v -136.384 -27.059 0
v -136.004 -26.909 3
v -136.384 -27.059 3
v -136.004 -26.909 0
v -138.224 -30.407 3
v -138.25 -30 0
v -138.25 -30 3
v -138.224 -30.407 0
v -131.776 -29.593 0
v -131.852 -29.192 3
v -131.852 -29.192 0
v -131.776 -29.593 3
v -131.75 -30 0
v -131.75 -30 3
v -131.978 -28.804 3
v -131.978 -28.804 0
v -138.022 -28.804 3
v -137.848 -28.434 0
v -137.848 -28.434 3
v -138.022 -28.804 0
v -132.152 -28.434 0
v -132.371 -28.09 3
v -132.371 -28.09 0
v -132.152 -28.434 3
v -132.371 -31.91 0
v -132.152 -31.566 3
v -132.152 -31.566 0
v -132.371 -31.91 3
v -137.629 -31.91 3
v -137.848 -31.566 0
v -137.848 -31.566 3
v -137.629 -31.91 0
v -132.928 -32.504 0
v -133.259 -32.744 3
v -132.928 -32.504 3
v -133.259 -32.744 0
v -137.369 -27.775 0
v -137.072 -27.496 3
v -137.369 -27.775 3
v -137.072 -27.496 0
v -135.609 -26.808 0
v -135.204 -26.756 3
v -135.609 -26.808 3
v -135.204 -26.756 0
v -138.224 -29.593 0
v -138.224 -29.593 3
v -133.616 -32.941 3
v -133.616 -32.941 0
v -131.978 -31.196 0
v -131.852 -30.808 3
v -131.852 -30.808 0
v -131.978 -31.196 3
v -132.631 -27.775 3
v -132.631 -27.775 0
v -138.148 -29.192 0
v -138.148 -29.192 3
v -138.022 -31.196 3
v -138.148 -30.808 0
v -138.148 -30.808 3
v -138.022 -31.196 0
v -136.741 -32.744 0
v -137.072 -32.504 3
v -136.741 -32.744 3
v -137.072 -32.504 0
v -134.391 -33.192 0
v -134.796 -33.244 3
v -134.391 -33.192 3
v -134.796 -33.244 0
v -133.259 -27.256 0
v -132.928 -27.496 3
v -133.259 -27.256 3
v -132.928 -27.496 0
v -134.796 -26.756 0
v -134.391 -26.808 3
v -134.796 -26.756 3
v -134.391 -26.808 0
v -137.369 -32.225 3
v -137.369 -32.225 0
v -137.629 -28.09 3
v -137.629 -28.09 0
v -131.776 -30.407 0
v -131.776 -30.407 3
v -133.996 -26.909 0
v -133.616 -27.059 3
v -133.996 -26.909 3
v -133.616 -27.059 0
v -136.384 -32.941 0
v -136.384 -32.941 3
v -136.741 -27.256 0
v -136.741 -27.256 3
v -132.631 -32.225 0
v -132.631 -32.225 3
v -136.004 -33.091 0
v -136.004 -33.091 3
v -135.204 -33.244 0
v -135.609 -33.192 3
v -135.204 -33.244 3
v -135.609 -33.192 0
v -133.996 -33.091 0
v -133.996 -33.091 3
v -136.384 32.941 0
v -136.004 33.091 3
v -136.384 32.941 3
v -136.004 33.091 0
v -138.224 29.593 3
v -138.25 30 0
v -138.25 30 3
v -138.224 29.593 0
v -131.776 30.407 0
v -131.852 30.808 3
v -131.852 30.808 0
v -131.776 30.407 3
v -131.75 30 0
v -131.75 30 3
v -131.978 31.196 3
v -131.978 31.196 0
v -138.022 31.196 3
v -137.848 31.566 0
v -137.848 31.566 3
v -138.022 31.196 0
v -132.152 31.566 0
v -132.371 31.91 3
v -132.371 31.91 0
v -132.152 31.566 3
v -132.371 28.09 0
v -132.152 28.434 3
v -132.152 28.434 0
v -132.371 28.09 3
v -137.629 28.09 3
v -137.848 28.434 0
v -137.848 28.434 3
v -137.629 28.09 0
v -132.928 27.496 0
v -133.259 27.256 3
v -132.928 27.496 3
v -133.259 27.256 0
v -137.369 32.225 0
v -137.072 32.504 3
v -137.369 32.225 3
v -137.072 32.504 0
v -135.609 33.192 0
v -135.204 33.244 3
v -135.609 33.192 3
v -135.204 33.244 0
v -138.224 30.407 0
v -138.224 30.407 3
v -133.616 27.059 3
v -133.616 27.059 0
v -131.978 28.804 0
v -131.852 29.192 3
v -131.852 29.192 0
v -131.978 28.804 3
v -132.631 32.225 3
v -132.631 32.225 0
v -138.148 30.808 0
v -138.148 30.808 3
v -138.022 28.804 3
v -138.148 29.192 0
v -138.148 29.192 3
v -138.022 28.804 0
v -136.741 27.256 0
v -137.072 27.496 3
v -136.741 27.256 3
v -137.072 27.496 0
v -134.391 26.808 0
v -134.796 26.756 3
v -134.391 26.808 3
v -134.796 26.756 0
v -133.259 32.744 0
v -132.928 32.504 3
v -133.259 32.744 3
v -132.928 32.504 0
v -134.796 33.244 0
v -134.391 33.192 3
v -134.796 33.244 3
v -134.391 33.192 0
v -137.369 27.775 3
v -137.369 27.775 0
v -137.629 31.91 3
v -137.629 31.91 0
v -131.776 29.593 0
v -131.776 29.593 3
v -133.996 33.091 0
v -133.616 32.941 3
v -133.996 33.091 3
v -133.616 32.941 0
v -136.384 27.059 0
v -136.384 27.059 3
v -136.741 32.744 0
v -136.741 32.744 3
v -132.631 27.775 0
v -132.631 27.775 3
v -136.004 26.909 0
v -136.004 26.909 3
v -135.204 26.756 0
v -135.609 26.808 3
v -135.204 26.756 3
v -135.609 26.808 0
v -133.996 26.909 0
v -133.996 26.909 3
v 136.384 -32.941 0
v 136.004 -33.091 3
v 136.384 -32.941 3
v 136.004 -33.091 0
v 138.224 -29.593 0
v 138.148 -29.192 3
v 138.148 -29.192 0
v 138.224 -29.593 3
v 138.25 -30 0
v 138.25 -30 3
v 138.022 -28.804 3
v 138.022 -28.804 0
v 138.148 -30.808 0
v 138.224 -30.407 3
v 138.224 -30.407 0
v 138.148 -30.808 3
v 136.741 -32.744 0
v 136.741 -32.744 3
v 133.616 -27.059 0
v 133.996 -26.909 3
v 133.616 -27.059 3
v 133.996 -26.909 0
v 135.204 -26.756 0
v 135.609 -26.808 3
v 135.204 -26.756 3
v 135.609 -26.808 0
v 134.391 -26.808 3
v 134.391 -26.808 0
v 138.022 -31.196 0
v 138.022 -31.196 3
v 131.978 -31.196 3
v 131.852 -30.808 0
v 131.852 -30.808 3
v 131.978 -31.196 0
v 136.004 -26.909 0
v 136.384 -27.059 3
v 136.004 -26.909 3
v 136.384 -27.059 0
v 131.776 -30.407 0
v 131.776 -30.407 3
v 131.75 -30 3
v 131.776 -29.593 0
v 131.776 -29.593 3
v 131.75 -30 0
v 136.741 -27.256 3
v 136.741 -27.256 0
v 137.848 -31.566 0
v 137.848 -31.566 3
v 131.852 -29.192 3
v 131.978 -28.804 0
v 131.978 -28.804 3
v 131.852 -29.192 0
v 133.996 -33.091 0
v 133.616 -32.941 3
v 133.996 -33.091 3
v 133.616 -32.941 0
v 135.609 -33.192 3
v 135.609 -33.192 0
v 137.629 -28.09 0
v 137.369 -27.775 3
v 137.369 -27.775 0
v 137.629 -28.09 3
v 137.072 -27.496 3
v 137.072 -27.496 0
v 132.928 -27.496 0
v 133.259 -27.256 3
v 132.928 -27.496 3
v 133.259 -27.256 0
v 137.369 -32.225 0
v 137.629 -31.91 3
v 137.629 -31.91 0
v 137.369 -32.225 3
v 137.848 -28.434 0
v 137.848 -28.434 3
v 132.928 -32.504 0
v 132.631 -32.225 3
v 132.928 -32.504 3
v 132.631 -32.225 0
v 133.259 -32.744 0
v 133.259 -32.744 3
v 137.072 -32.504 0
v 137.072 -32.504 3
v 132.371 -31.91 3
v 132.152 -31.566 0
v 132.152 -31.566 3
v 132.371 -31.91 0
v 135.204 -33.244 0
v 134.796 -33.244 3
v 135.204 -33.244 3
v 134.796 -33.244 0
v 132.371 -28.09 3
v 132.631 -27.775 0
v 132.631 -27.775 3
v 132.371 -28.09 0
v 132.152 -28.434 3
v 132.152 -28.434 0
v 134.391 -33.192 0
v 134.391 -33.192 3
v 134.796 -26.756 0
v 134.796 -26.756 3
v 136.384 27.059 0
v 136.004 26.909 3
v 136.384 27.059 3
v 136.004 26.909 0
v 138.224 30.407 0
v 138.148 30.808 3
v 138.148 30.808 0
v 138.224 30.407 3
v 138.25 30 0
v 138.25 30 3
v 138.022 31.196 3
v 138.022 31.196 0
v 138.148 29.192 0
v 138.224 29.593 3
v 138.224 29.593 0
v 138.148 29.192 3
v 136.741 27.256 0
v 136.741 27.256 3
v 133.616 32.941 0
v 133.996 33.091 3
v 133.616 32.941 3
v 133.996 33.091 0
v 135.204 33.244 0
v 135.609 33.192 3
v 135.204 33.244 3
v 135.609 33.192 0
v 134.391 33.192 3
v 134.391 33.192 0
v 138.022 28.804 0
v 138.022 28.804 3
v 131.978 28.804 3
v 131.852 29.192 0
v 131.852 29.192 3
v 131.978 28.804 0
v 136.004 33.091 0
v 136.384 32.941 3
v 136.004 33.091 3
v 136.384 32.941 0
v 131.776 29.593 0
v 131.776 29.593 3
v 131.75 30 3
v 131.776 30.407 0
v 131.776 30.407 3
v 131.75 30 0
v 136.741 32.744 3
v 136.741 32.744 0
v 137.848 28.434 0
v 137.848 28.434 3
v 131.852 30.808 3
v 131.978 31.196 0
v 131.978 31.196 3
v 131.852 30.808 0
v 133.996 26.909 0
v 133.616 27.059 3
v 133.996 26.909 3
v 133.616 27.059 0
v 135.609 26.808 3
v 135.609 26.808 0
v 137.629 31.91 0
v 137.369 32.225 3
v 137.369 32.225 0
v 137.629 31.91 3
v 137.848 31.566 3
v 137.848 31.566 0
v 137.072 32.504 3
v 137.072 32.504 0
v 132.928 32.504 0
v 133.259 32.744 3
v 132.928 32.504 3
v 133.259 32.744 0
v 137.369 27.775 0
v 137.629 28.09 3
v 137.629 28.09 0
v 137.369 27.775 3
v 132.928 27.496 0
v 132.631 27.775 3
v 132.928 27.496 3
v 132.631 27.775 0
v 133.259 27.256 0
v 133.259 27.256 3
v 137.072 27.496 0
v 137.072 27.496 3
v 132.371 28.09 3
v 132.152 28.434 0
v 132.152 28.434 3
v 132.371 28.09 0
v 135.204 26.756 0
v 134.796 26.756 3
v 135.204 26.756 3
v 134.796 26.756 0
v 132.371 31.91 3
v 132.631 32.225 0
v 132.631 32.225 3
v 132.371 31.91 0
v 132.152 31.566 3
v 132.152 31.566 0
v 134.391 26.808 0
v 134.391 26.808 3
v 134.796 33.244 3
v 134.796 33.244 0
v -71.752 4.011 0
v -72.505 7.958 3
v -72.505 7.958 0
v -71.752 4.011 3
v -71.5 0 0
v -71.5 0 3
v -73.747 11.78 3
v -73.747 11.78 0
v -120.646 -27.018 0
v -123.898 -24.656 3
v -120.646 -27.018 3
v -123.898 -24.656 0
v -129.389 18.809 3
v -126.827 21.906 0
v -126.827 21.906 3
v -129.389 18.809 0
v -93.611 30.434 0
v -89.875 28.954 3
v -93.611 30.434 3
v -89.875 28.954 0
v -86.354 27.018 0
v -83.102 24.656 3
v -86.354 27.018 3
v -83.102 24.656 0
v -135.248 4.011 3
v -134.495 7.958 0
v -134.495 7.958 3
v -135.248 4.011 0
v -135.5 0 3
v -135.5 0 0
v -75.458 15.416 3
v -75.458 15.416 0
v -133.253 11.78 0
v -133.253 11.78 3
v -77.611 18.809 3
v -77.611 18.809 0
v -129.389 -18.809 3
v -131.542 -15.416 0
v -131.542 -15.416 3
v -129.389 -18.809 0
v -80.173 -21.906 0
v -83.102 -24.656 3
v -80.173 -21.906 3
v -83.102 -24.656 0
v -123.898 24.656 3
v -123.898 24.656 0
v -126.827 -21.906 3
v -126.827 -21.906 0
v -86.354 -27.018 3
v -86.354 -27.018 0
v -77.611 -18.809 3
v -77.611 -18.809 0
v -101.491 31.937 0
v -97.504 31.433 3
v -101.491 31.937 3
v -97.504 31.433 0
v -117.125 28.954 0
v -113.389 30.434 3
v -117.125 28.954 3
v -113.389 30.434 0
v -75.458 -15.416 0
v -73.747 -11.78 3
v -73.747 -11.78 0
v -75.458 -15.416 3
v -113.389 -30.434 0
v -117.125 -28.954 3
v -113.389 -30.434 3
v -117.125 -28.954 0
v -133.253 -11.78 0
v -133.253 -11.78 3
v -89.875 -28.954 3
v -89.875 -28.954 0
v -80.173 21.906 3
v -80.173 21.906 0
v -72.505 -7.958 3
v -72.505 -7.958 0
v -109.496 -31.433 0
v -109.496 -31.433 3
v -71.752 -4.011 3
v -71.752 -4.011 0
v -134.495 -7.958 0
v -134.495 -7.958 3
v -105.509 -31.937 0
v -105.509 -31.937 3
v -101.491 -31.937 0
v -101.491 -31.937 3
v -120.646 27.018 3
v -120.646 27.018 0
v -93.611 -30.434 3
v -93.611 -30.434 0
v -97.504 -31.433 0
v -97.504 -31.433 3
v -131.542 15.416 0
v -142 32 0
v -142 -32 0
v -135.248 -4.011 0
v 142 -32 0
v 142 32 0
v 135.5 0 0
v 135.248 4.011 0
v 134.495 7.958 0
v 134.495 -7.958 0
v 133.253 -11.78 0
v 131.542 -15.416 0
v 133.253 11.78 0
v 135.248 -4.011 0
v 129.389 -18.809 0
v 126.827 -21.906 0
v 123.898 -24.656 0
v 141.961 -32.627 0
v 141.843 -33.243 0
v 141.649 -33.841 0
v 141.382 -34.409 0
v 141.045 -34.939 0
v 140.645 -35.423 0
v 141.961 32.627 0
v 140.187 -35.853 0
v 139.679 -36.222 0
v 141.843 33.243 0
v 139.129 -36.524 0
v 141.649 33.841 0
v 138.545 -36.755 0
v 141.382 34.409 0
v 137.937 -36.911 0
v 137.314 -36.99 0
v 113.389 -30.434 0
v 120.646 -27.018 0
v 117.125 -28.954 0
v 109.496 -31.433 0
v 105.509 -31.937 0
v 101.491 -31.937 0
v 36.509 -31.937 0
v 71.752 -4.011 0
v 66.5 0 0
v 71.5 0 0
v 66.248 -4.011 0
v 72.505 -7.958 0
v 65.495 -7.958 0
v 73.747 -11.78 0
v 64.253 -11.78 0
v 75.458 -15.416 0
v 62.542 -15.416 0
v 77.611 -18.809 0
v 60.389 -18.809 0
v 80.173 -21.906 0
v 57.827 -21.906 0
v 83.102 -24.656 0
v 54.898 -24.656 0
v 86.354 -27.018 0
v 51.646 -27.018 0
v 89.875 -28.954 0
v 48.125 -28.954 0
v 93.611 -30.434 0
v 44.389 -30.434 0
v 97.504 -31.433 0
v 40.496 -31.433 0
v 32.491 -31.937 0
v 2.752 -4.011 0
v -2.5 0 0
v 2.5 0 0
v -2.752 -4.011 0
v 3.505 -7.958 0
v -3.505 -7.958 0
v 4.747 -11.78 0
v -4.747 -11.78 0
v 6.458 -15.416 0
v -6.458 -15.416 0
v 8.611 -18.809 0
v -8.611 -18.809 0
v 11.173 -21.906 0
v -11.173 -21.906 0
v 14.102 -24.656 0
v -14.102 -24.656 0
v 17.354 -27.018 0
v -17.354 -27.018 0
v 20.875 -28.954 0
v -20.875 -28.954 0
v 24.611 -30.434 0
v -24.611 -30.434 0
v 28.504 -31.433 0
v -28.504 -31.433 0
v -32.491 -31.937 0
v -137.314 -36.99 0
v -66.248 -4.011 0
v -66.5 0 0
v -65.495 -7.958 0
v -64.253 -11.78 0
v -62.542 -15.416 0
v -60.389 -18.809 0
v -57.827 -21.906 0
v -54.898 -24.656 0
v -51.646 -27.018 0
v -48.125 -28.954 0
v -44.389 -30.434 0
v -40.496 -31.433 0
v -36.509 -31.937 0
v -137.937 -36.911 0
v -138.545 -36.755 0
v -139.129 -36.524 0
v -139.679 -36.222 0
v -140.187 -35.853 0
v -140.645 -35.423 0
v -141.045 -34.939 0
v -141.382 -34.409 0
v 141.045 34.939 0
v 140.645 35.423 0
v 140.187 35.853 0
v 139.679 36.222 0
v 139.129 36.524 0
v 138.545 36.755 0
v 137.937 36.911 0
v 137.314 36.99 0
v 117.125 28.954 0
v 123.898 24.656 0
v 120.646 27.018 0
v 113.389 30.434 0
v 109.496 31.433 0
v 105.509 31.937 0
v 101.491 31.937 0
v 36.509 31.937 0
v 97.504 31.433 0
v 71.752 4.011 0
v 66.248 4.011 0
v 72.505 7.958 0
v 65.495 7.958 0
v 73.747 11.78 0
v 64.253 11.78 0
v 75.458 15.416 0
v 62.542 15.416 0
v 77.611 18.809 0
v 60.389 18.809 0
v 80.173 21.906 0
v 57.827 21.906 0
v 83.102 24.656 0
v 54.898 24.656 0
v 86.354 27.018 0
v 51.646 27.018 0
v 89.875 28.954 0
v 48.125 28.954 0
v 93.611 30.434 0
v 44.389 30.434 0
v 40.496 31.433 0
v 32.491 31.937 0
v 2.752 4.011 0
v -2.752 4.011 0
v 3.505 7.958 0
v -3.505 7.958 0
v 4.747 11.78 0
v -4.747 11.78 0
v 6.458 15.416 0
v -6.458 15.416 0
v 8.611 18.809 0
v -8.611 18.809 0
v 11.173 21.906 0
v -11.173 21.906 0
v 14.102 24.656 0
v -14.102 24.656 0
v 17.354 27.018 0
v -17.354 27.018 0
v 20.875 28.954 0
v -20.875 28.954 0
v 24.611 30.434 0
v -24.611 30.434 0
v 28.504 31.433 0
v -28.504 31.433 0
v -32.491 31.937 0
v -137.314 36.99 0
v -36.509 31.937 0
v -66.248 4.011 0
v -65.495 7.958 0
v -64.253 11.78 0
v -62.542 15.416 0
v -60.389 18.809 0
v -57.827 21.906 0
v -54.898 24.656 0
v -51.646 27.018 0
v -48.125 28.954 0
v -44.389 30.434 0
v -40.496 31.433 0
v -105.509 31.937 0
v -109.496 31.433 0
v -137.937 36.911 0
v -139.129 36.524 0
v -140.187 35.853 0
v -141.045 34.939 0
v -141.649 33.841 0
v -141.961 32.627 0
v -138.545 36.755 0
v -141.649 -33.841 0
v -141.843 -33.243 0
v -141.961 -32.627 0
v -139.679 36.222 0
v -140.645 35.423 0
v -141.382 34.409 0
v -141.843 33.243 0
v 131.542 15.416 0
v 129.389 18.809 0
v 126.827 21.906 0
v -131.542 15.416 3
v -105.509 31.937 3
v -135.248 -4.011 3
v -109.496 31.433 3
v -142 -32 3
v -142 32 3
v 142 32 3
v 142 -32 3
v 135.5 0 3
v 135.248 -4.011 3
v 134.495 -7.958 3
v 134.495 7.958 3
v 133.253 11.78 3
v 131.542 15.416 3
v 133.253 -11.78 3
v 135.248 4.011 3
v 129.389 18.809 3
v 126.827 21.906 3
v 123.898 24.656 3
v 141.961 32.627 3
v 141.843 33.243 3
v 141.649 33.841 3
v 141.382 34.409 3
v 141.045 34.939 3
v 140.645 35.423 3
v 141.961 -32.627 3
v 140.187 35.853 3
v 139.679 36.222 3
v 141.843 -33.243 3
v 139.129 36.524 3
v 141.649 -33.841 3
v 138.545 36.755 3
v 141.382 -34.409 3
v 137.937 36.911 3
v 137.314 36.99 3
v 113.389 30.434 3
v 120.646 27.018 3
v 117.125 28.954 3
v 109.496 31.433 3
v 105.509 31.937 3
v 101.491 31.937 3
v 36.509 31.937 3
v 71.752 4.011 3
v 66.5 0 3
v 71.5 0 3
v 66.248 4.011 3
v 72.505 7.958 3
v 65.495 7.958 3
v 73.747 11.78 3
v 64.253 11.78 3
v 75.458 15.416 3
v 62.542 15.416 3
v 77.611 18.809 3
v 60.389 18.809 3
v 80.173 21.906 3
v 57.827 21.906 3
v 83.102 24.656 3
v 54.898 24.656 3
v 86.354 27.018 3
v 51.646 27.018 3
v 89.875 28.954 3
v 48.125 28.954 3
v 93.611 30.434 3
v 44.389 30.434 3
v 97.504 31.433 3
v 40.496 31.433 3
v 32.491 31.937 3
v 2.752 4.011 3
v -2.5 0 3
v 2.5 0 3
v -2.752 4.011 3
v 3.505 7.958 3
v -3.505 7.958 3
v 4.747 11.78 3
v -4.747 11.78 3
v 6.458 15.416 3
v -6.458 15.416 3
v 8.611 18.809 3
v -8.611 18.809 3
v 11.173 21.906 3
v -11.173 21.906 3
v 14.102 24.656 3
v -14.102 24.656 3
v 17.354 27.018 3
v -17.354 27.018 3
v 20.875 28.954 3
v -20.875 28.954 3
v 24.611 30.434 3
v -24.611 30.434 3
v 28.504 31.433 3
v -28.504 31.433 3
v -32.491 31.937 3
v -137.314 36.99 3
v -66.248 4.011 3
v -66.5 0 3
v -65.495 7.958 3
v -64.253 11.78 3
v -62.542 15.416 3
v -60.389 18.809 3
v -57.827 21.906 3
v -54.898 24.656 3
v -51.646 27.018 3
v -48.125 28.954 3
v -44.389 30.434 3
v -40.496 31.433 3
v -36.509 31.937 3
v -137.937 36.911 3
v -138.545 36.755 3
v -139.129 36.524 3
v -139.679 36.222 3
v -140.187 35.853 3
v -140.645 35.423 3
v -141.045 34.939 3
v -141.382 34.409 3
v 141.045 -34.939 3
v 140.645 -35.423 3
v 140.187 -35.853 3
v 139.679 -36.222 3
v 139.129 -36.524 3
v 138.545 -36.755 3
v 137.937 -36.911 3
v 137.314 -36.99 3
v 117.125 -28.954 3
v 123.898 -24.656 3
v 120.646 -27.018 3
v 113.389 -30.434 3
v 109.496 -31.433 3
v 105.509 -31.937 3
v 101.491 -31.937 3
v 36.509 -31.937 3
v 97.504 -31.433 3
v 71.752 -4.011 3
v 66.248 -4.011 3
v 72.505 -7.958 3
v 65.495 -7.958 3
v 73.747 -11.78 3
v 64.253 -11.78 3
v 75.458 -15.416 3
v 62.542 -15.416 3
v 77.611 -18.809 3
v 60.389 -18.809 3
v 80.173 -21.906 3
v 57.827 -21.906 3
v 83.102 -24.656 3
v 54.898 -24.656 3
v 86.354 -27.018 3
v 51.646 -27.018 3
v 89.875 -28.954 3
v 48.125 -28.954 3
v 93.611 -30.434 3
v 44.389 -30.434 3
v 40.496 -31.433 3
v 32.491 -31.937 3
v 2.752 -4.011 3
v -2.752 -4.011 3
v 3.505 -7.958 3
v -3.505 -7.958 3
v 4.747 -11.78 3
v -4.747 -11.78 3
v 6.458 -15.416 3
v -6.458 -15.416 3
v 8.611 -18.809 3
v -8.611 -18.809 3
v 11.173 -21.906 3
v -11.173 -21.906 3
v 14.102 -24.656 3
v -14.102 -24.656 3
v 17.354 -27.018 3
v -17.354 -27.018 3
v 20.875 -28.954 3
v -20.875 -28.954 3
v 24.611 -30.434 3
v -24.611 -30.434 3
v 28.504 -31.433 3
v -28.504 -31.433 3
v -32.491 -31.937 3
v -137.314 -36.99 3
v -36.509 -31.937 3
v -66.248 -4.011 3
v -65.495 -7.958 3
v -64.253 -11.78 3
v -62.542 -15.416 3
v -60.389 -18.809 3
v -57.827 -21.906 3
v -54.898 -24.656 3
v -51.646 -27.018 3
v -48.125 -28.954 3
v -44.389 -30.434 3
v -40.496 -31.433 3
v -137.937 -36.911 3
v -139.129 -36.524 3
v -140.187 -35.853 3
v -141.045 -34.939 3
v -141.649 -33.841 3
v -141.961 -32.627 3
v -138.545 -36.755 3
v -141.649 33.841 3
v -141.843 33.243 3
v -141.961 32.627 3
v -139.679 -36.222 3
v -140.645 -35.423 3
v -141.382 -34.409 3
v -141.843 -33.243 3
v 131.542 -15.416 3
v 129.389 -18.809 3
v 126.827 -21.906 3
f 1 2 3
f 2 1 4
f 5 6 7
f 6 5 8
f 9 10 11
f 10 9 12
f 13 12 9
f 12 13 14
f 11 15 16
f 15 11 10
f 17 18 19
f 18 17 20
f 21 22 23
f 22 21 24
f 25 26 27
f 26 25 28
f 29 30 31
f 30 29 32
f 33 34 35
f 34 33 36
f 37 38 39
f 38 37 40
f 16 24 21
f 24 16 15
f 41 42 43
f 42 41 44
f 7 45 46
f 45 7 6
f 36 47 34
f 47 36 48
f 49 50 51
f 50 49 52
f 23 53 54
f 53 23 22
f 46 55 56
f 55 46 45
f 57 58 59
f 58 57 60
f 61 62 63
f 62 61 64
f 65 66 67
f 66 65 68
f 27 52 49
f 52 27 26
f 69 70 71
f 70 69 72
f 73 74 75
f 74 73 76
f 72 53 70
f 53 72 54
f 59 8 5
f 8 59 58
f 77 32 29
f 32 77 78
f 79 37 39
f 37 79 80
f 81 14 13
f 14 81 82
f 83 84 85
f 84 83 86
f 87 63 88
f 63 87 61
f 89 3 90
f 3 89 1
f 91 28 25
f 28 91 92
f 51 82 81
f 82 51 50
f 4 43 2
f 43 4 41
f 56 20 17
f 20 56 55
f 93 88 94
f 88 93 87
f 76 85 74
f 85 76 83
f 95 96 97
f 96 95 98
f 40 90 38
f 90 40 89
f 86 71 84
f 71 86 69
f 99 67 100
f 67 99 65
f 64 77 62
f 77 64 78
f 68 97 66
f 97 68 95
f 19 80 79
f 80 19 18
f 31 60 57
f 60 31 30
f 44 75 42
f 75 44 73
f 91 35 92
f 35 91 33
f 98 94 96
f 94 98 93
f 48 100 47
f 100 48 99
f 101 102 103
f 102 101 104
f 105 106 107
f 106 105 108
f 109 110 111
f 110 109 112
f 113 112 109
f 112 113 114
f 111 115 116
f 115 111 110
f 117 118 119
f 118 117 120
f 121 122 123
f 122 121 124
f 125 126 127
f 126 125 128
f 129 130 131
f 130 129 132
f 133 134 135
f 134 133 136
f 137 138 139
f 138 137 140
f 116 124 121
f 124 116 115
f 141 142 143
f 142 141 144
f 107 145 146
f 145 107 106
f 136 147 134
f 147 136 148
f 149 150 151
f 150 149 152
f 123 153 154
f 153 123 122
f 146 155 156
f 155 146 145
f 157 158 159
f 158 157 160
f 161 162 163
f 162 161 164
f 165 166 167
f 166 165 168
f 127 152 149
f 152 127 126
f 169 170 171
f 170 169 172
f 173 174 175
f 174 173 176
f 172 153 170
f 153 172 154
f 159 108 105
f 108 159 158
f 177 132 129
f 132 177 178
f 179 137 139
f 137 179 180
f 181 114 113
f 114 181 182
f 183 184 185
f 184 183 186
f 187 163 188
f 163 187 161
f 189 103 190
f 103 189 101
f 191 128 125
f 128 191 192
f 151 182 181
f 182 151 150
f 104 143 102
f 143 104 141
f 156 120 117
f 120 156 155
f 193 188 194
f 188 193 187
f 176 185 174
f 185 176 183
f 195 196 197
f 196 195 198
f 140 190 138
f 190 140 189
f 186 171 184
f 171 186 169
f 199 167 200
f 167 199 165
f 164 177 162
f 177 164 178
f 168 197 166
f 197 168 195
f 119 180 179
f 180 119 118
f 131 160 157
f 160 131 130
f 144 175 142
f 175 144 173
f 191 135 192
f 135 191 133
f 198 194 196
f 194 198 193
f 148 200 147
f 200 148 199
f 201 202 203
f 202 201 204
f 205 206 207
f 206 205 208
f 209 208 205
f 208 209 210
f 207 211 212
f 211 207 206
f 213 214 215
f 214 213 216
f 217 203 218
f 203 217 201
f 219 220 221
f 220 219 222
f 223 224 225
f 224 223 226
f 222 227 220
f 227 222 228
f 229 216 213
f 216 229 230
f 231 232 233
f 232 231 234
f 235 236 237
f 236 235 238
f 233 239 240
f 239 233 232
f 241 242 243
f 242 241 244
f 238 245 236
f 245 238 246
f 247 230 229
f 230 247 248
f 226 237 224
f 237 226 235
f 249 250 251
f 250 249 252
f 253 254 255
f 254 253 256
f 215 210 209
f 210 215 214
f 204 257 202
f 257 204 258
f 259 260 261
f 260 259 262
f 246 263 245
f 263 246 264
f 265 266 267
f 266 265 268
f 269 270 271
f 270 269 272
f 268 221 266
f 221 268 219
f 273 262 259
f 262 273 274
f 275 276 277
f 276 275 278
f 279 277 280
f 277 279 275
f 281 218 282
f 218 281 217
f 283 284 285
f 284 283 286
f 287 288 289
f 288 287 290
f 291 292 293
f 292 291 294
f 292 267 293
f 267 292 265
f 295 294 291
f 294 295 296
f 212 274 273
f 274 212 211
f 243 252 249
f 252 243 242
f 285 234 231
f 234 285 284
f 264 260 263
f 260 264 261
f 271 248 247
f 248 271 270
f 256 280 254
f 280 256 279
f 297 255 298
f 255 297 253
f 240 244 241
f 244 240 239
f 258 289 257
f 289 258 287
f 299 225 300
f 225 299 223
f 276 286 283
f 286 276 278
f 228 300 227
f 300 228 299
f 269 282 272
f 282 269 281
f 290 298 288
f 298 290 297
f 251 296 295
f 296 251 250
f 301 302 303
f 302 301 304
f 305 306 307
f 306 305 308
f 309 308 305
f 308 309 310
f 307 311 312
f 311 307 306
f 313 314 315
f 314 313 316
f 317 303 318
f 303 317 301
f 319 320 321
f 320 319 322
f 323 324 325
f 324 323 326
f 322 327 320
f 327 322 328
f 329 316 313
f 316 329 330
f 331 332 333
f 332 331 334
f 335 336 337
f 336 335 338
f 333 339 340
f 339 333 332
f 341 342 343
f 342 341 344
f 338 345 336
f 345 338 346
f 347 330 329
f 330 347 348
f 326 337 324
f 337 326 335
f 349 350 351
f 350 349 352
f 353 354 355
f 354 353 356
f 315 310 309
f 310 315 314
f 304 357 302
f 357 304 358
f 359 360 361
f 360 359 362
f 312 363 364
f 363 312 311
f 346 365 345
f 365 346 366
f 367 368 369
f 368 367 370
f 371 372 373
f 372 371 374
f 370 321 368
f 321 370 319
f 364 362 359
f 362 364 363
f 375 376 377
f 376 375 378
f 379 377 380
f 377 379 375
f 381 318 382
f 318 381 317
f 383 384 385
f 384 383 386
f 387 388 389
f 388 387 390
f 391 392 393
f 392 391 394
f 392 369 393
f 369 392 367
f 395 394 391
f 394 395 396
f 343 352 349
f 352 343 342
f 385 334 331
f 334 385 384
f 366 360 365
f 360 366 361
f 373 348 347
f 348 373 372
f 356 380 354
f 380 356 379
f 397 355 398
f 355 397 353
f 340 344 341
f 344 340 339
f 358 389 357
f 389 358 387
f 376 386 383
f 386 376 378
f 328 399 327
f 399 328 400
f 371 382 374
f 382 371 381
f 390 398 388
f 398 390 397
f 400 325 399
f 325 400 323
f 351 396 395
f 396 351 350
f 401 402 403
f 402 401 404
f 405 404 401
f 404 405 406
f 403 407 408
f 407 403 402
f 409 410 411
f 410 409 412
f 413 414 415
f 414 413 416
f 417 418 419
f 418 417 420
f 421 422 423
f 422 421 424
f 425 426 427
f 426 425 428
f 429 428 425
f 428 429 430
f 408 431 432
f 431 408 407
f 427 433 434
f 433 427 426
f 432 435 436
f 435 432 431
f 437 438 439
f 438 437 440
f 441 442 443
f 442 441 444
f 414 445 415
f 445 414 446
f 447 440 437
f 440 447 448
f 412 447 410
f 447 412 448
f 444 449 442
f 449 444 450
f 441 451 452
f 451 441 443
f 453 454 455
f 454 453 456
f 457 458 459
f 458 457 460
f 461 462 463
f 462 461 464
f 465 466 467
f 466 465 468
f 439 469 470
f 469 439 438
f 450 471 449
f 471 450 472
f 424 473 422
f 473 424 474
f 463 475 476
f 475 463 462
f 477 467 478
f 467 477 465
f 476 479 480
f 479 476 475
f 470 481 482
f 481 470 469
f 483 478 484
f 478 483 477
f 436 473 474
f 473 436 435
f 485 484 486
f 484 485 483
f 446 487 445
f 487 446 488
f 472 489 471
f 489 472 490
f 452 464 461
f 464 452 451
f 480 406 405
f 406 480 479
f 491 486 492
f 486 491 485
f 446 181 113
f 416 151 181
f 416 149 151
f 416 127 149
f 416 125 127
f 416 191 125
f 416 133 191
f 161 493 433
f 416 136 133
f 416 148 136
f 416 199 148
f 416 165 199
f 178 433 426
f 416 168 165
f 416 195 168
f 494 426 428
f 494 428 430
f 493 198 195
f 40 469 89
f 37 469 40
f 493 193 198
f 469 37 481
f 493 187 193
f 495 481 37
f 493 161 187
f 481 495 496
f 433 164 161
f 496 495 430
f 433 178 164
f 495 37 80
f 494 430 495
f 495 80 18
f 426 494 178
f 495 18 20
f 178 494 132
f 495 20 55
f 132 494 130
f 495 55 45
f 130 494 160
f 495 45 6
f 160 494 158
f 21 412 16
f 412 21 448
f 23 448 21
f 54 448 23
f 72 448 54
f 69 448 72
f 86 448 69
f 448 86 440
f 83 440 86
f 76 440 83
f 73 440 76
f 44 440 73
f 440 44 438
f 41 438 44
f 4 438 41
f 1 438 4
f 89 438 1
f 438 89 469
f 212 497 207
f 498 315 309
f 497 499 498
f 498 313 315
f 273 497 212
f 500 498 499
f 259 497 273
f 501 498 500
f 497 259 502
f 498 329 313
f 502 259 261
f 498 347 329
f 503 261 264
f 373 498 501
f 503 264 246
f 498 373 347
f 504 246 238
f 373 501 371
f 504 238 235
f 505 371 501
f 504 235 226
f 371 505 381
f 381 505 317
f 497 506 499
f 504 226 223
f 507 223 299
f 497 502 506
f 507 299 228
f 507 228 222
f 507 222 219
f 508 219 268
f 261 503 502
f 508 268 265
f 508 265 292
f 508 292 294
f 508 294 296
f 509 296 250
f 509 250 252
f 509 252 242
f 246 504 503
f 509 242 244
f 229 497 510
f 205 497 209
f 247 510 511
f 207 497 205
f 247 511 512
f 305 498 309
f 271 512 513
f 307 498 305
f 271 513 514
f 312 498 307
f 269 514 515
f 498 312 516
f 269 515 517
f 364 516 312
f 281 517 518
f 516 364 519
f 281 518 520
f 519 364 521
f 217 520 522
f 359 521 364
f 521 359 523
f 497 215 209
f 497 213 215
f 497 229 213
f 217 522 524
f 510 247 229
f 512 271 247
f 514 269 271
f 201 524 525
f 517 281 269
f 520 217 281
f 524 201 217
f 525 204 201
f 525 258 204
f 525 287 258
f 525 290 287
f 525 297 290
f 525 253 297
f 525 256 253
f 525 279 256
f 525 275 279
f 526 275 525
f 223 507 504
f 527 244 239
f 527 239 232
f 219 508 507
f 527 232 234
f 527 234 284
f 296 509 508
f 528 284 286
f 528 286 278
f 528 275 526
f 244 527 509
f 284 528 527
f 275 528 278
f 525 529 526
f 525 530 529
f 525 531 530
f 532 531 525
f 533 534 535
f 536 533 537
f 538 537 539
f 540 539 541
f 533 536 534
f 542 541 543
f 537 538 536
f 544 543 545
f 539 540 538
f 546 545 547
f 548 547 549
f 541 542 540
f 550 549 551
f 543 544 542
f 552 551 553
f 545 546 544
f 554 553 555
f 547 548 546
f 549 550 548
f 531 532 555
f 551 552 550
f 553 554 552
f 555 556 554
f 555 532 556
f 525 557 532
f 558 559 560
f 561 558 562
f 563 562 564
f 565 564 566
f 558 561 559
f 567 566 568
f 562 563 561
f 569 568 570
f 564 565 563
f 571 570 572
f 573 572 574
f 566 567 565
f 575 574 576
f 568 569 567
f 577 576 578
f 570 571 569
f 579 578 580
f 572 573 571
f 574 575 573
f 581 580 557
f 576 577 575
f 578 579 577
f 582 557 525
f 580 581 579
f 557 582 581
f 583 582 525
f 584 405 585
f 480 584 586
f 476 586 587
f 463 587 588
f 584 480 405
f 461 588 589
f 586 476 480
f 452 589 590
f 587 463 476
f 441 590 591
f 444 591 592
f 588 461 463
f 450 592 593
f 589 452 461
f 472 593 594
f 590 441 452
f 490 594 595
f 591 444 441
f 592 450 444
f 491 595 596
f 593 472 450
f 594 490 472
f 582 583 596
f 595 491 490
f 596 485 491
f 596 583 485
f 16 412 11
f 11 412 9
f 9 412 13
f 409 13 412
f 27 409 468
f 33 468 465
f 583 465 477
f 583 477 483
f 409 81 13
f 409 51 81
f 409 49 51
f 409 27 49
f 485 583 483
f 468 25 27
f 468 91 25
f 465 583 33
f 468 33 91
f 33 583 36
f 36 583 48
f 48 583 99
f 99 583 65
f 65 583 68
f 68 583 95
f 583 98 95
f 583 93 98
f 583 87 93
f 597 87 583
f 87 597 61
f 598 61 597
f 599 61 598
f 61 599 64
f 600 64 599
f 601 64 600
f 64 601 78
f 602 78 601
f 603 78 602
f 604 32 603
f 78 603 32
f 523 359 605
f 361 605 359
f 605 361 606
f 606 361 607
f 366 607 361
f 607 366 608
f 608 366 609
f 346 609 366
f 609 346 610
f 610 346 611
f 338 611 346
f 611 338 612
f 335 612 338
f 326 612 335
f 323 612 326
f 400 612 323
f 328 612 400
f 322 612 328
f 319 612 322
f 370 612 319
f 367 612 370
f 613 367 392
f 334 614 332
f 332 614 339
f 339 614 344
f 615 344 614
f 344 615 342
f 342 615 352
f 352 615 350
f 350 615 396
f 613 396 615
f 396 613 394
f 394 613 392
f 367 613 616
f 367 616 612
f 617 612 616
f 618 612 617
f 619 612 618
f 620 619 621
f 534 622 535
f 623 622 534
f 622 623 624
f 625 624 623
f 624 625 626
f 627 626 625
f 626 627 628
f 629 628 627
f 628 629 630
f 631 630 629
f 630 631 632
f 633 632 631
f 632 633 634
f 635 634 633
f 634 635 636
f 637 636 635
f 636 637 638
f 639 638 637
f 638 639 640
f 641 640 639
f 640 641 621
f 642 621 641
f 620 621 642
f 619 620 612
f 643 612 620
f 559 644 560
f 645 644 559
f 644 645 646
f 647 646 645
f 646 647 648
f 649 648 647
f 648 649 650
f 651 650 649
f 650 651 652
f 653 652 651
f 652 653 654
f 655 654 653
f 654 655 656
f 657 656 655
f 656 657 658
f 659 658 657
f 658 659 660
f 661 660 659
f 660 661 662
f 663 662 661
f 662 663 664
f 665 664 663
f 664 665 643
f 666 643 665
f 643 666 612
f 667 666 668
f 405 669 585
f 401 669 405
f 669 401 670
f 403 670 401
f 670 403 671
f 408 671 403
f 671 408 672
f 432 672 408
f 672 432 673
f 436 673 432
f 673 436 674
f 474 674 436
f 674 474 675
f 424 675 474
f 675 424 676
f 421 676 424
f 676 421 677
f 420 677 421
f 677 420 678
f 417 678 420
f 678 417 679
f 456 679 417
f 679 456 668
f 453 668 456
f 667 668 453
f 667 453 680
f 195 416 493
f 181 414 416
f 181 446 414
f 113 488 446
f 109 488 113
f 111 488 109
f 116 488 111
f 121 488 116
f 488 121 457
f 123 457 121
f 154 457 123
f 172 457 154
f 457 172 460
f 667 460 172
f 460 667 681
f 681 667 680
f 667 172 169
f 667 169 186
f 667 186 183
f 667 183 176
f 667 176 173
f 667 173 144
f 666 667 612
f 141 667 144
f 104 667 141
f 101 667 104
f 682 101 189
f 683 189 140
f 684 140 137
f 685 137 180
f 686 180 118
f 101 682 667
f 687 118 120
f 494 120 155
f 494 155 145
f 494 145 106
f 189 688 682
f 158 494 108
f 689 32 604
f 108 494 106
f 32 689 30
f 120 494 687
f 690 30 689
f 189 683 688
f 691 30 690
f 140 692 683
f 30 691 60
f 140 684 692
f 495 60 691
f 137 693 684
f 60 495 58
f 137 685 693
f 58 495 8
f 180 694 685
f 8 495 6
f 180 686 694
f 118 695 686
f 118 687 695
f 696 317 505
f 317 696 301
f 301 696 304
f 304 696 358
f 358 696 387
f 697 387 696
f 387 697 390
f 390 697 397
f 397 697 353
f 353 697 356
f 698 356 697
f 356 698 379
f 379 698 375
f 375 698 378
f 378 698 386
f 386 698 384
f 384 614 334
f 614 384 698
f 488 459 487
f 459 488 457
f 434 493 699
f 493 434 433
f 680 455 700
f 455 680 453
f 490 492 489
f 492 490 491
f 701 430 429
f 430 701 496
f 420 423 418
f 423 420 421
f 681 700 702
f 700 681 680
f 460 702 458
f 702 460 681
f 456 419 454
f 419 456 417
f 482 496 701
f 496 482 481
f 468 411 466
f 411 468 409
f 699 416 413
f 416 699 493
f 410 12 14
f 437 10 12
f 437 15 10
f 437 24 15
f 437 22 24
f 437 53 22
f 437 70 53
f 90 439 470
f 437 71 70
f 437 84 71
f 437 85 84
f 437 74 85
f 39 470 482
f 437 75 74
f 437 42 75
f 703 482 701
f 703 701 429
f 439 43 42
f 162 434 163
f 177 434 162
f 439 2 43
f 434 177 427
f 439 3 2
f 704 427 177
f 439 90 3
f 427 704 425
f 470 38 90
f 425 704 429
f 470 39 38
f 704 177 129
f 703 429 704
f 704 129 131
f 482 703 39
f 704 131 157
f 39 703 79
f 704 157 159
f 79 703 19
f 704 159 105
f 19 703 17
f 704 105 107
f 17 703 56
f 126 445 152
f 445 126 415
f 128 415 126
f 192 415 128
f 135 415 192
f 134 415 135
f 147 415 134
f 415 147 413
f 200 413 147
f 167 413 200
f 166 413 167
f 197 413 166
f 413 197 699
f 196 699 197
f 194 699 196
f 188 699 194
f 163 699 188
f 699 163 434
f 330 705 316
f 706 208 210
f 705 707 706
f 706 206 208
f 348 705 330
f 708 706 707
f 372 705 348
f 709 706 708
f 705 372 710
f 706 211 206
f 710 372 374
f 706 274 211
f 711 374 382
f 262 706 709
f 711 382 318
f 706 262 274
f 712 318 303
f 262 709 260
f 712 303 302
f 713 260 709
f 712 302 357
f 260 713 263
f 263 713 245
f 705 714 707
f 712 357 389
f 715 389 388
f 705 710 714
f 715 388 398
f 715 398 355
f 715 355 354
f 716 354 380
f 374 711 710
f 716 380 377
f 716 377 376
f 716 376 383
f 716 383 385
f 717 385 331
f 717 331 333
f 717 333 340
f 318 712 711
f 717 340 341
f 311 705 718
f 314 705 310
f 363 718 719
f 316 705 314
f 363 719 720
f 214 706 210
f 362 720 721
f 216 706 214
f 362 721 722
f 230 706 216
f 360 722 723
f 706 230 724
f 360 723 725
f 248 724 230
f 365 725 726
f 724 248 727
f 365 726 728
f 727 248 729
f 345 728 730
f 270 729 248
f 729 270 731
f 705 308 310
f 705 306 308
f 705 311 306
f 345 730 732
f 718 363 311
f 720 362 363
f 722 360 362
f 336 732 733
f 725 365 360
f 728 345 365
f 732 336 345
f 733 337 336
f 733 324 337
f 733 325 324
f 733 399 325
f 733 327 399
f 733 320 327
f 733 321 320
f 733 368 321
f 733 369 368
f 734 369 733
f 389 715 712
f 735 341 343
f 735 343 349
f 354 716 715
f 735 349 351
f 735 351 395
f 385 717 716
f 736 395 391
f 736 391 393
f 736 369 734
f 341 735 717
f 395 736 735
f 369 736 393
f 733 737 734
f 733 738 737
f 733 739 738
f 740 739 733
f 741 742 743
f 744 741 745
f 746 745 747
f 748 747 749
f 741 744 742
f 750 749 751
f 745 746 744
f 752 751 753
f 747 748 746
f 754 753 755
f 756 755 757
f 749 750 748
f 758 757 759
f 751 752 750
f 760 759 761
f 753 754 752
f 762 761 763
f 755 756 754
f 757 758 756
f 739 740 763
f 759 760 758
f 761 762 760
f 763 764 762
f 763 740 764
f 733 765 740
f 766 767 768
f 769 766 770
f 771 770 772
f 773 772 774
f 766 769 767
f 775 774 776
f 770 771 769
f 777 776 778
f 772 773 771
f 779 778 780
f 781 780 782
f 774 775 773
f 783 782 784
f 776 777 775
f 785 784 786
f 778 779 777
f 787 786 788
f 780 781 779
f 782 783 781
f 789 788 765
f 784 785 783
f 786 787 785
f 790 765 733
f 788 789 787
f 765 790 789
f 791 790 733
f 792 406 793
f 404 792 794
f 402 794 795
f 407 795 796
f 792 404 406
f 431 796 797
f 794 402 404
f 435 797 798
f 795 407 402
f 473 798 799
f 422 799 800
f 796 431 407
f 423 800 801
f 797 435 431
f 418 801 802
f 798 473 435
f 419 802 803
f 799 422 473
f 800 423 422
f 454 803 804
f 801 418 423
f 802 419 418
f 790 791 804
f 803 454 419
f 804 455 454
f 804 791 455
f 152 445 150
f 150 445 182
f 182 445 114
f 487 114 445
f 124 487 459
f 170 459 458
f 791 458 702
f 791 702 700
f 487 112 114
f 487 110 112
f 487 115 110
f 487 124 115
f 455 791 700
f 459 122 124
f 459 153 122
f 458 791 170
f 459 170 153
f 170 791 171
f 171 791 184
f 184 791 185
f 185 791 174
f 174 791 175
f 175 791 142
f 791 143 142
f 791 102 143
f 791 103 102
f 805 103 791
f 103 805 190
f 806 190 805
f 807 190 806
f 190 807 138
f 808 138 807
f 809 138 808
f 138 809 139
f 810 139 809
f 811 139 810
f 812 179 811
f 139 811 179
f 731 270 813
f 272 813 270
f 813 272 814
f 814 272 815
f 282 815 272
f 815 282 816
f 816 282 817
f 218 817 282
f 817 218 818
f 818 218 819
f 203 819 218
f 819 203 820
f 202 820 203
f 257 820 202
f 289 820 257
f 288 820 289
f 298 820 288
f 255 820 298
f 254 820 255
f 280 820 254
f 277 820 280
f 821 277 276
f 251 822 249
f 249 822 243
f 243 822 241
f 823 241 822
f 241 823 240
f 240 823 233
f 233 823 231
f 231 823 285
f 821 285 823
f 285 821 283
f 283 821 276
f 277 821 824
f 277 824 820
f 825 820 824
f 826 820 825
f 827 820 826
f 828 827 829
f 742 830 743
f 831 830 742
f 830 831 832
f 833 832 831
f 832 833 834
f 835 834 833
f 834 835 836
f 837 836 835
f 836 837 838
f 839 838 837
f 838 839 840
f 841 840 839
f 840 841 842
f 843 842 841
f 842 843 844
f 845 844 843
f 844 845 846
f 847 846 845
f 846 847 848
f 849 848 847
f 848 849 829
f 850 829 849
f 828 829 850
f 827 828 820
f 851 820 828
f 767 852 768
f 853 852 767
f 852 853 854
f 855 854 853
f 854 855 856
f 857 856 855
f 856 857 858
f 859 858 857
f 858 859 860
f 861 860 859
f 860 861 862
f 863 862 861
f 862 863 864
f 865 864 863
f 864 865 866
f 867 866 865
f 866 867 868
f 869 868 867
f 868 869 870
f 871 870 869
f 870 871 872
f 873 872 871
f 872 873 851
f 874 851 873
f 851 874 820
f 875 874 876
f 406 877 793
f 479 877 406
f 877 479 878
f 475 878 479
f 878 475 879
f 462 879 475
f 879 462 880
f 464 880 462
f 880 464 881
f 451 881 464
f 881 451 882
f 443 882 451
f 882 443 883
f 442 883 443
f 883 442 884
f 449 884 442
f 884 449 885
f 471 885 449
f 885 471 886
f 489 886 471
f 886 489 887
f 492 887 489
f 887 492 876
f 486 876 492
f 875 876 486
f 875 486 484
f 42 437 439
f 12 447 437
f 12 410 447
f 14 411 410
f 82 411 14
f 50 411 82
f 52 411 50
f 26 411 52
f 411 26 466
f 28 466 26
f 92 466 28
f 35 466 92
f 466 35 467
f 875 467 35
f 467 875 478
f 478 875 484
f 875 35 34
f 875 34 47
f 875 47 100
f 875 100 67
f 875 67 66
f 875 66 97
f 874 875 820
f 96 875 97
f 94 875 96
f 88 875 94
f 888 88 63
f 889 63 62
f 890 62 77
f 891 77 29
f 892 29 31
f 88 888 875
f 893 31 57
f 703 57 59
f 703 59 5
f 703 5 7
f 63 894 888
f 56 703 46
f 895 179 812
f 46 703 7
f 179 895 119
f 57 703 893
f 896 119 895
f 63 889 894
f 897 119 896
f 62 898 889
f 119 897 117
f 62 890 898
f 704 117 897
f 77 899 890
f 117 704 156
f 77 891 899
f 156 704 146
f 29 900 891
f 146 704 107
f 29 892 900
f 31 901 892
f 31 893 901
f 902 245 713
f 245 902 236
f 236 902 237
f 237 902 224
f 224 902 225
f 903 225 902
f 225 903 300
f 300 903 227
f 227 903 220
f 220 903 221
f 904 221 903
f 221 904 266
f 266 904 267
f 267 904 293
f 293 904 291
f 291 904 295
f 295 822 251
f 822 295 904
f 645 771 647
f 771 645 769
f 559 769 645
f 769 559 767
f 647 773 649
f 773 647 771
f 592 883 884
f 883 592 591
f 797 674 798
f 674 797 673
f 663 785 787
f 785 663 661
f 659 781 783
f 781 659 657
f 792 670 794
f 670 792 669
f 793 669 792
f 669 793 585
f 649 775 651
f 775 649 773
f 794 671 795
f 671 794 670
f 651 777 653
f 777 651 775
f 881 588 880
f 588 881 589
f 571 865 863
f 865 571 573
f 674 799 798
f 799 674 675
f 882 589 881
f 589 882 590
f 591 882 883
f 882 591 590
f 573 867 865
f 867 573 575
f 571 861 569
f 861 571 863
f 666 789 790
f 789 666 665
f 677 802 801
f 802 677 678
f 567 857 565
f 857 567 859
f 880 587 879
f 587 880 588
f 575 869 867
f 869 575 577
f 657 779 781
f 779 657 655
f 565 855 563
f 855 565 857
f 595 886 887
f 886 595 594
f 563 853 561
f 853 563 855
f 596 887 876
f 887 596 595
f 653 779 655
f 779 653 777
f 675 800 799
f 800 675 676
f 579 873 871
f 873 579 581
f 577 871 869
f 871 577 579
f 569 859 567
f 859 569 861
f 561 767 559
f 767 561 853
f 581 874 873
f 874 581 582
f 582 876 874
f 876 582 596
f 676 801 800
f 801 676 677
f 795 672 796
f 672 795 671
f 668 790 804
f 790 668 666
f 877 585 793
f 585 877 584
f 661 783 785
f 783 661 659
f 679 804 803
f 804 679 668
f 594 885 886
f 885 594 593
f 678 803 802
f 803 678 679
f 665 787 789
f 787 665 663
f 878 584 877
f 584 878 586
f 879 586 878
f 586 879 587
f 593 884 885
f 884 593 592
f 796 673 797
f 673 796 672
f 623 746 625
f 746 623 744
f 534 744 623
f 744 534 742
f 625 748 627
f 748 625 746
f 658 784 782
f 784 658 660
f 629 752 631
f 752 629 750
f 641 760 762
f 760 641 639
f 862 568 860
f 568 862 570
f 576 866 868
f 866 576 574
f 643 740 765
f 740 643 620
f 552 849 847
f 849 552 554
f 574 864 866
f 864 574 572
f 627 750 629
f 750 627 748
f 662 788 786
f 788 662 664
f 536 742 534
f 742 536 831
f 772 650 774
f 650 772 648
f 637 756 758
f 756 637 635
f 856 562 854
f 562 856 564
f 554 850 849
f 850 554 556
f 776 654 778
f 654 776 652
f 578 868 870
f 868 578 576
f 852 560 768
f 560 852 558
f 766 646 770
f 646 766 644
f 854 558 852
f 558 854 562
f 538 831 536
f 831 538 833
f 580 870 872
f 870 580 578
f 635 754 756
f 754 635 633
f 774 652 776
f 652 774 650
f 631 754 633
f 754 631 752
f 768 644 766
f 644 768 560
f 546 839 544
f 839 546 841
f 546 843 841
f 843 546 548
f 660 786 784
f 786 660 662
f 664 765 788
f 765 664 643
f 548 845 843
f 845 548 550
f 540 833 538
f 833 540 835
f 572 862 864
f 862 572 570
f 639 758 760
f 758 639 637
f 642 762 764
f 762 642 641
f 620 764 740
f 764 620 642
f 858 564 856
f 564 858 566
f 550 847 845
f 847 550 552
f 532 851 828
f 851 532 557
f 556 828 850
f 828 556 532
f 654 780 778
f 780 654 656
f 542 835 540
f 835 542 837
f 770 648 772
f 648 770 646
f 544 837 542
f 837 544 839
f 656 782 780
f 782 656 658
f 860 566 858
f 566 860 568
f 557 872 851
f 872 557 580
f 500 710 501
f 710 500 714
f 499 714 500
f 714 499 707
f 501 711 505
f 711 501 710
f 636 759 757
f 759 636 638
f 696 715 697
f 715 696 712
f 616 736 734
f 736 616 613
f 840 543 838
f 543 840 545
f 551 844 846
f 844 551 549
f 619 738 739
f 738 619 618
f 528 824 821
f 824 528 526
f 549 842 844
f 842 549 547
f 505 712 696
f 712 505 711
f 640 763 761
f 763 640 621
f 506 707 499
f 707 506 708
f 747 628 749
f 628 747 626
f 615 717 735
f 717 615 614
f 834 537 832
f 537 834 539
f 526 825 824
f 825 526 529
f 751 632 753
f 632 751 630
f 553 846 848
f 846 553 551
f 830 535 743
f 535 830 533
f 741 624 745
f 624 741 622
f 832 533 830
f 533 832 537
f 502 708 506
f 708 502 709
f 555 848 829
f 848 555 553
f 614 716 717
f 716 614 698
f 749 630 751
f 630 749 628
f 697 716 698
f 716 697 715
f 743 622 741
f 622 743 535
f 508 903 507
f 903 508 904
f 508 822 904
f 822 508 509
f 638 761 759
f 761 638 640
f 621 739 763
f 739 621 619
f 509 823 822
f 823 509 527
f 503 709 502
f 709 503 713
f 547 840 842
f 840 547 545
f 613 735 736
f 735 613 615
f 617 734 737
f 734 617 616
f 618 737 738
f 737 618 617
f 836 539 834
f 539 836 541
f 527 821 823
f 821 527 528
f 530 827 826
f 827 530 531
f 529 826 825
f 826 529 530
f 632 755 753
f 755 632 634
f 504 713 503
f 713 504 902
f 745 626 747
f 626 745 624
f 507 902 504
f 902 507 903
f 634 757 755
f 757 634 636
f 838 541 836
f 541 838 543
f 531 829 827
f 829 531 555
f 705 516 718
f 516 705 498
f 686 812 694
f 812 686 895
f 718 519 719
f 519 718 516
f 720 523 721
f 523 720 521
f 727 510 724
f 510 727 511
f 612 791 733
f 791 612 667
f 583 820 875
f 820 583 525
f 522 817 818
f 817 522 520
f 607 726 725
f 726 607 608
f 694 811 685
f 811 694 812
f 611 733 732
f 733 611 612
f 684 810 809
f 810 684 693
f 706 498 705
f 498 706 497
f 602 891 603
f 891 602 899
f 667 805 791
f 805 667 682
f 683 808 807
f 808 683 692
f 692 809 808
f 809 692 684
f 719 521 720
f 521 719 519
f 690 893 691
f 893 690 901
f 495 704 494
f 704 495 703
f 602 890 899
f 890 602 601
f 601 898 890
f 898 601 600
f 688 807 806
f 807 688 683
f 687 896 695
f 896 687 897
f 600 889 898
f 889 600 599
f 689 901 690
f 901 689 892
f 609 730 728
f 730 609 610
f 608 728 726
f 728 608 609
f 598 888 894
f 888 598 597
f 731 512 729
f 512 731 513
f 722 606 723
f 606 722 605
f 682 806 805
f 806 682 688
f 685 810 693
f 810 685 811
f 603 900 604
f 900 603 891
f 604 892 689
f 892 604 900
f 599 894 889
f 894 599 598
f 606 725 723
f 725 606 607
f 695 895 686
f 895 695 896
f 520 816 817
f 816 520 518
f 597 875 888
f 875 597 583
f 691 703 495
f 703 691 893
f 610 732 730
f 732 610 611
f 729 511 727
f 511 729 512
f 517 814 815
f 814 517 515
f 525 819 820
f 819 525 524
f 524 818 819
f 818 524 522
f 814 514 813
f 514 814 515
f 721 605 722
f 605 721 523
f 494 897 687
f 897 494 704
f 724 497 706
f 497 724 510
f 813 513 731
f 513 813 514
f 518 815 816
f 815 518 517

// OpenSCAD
$fn = 50;

difference() {
	union() {
		hull() {
			translate(v = [-137.0, 32.0, 0]) {
				cylinder(h = 3, r = 5);
			}
			translate(v = [137.0, 32.0, 0]) {
				cylinder(h = 3, r = 5);
			}
			translate(v = [-137.0, -32.0, 0]) {
				cylinder(h = 3, r = 5);
			}
			translate(v = [137.0, -32.0, 0]) {
				cylinder(h = 3, r = 5);
			}
		}
	}
	union() {
		translate(v = [-135.0, -30.0, -100.0]) {
			cylinder(h = 200, r = 3.25);
		}
		translate(v = [-135.0, 30.0, -100.0]) {
			cylinder(h = 200, r = 3.25);
		}
		translate(v = [135.0, -30.0, -100.0]) {
			cylinder(h = 200, r = 3.25);
		}
		translate(v = [135.0, 30.0, -100.0]) {
			cylinder(h = 200, r = 3.25);
		}
		translate(v = [-135.0, -30.0, -100.0]) {
			cylinder(h = 200, r = 1.8);
		}
		translate(v = [-135.0, 30.0, -100.0]) {
			cylinder(h = 200, r = 1.8);
		}
		translate(v = [135.0, -30.0, -100.0]) {
			cylinder(h = 200, r = 1.8);
		}
		translate(v = [135.0, 30.0, -100.0]) {
			cylinder(h = 200, r = 1.8);
		}
		translate(v = [-103.5, 0, 0.0]) {
			cylinder(h = 3, r = 32.0);
		}
		translate(v = [-34.5, 0, 0.0]) {
			cylinder(h = 3, r = 32.0);
		}
		translate(v = [34.5, 0, 0.0]) {
			cylinder(h = 3, r = 32.0);
		}
		translate(v = [103.5, 0, 0.0]) {
			cylinder(h = 3, r = 32.0);
		}
	}
}
